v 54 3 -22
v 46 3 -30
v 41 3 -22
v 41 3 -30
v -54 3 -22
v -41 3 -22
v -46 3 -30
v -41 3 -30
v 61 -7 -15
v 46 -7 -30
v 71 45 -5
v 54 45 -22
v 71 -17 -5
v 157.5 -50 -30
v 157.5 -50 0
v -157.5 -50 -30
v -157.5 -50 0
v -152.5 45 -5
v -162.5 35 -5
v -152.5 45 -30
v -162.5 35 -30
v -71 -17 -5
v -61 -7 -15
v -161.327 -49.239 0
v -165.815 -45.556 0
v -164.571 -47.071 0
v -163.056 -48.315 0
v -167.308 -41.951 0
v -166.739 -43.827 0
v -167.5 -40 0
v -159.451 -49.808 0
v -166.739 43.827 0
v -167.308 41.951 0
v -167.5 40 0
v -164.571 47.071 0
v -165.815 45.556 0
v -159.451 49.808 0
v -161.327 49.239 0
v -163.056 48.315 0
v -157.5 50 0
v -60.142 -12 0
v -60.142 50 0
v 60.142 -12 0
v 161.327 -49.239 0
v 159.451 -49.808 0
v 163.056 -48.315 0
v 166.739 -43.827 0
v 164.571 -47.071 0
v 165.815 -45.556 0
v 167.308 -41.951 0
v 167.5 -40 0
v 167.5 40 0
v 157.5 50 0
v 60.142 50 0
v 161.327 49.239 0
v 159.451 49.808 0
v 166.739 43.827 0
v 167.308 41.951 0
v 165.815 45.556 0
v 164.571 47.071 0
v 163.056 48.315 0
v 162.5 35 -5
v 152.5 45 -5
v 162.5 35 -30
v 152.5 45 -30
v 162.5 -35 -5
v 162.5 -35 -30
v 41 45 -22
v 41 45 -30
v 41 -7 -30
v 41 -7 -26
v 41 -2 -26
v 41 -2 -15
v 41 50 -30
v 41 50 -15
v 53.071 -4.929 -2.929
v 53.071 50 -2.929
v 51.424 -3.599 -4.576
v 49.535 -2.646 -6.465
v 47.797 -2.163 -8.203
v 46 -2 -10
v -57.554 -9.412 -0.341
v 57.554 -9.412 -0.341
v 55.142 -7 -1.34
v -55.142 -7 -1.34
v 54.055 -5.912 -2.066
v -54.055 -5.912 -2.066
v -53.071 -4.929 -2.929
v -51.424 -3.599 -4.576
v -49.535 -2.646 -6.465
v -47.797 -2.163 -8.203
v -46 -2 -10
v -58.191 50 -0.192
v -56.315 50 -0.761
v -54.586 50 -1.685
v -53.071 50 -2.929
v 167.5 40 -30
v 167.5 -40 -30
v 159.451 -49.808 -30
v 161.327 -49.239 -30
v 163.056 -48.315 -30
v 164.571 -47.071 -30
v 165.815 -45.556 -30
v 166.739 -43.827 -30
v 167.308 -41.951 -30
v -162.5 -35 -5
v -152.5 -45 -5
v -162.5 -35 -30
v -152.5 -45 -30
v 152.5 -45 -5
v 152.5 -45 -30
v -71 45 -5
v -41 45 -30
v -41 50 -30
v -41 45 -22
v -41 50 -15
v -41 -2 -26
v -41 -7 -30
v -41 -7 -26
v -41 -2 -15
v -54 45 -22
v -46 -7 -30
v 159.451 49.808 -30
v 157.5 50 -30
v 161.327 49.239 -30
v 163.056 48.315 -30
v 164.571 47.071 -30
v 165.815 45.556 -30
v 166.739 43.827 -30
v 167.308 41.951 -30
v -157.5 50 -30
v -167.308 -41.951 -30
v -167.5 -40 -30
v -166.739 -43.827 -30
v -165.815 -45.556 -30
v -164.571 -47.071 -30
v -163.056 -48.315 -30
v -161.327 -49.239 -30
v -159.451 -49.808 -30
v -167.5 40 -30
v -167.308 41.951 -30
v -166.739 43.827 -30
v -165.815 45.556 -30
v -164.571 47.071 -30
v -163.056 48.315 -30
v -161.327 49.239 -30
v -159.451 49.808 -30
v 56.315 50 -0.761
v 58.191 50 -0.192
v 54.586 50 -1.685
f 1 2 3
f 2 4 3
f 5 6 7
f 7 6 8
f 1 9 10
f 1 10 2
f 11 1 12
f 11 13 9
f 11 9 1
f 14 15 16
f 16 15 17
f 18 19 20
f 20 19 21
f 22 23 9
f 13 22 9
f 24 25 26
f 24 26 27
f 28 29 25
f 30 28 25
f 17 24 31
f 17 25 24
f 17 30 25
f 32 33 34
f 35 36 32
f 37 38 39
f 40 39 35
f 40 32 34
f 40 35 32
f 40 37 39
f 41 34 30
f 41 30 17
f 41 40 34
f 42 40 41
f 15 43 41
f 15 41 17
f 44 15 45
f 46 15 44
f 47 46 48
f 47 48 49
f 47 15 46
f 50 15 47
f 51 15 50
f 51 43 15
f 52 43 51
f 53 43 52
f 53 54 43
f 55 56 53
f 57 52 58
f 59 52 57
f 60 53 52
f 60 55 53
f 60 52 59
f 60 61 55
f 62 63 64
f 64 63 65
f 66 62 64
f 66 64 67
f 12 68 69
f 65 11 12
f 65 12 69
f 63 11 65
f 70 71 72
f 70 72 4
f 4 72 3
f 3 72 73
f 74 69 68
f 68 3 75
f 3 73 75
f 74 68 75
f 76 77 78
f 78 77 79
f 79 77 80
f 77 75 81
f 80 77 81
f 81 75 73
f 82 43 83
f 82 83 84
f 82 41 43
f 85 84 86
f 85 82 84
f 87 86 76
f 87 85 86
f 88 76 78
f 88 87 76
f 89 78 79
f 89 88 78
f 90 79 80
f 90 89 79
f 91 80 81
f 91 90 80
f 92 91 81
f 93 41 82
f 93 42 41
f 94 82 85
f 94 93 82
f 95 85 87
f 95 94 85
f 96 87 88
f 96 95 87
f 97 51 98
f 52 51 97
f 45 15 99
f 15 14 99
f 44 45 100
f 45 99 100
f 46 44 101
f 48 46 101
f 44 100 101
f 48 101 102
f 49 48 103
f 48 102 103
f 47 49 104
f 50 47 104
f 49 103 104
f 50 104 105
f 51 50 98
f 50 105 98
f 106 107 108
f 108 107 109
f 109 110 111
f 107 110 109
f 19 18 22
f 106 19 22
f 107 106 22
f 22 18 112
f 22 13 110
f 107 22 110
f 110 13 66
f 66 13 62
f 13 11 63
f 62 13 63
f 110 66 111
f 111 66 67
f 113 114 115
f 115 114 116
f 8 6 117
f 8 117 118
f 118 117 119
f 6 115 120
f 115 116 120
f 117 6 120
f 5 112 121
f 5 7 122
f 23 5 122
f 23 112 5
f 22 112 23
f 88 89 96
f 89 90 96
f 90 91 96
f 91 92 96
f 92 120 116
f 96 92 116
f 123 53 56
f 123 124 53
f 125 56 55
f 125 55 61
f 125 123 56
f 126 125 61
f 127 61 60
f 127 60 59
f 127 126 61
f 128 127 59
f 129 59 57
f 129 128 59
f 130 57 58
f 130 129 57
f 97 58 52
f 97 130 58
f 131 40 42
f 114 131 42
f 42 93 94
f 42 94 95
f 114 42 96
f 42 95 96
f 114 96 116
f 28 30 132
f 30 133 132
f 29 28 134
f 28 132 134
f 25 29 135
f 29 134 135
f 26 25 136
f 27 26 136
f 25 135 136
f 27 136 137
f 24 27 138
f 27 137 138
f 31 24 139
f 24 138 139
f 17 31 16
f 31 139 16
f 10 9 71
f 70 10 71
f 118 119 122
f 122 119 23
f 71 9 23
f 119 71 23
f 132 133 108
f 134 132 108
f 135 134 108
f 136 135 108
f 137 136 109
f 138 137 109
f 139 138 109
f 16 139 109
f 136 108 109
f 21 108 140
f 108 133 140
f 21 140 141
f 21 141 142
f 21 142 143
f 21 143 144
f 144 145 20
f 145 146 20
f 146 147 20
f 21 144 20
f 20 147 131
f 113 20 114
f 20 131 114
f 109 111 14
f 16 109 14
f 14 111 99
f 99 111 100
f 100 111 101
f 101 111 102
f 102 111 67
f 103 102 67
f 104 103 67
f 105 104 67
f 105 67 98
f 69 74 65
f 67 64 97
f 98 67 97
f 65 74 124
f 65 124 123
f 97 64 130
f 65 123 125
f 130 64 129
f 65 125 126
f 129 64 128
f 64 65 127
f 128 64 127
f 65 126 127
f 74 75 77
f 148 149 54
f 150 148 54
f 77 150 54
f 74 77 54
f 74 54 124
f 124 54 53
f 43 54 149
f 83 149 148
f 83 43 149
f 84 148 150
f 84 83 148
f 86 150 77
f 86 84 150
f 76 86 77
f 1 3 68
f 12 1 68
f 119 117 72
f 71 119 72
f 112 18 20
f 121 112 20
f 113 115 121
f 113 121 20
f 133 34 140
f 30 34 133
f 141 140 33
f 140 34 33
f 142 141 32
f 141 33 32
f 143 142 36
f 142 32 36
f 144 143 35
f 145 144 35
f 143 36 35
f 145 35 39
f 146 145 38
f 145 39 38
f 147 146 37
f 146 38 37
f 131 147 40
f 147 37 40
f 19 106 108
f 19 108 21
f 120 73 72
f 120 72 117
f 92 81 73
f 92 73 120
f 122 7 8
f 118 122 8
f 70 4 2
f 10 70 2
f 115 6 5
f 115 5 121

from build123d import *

# Parameters (mm, degrees)
BOSS_EXTRUDE1_DEPTH = 5
BOSS_EXTRUDE2_DEPTH = 25
FILLET1_R           = 10
CHAMFER3_SIZE       = 25
CHAMFER4_SIZE       = 15
SKETCH3_W           = 8
SKETCH3_H           = 42
CUT_EXTRUDE1_DEPTH  = 25
SKETCH4_W           = 8
SKETCH4_H           = 42
CUT_EXTRUDE2_DEPTH  = 25
FILLET2_R           = 10
SKETCH5_W           = 82
SKETCH5_H           = 4
CUT_EXTRUDE3_DEPTH  = 10
CHAMFER5_SIZE       = 10
CHAMFER6_SIZE       = 10


with BuildPart() as part:
    # Sketch1 → Boss-Extrude1 (new body)
    with BuildSketch(Plane.XY):
        Polygon((-167.5, -50), (167.5, -50), (167.5, 50), (41, 50), (41, -2), (-41, -2), (-41, 50), (-167.5, 50), align=None)
    extrude(amount=-BOSS_EXTRUDE1_DEPTH)

    # Sketch2 → Boss-Extrude2 (add)
    with BuildSketch(Plane(origin=(0, 0, -5), x_dir=(-1, 0, 0), z_dir=(0, 0, -1))):
        Polygon((-167.5, 50), (-162.5, 50), (-41, 50), (-41, 45), (-41, -2), (41, -2), (41, 45), (41, 50), (162.5, 50), (167.5, 50), (167.5, -50), (162.5, -50), (-162.5, -50), (-167.5, -50), align=None)
        Polygon((-162.5, 45), (-162.5, -45), (162.5, -45), (162.5, 45), (46, 45), (46, -7), (41, -7), (-41, -7), (-46, -7), (-46, 45), align=None, mode=Mode.SUBTRACT)
    extrude(amount=BOSS_EXTRUDE2_DEPTH)

    # Fillet1
    fillet1_edges = [part.edges().sort_by_distance(p)[0] for p in [
        (167.5, 50, -15),
        (167.5, -50, -15),
        (-167.5, -50, -15),
        (-167.5, 50, -15),
    ]]
    fillet(fillet1_edges, radius=FILLET1_R)

    # Chamfer3
    chamfer3_edges = [part.edges().sort_by_distance(p)[0] for p in [
        (-46, 19, -5),
        (46, 19, -5),
    ]]
    chamfer(chamfer3_edges, length=CHAMFER3_SIZE - 0.0001)  # a hair under: the kernel refuses the full size

    # Chamfer4
    chamfer4_edges = [part.edges().sort_by_distance(p)[0] for p in [
        (-41, 24, 0),
        (41, 24, 0),
    ]]
    chamfer(chamfer4_edges, length=CHAMFER4_SIZE)

    # Sketch3 → Cut-Extrude1 (cut)
    with BuildSketch(Plane(origin=(-41, 0, 0), x_dir=(0, 0, -1), z_dir=(1, 0, 0))):
        with Locations((26, 24)):
            Rectangle(SKETCH3_W, SKETCH3_H)
    extrude(amount=-CUT_EXTRUDE1_DEPTH, mode=Mode.SUBTRACT)

    # Sketch4 → Cut-Extrude2 (cut)
    with BuildSketch(Plane.ZY.offset(-41)):
        with Locations((-26, 24)):
            Rectangle(SKETCH4_W, SKETCH4_H)
    extrude(amount=-CUT_EXTRUDE2_DEPTH, mode=Mode.SUBTRACT)

    # Fillet2
    fillet2_edges = [part.edges().sort_by_distance(p)[0] for p in [
        (0, -2, 0),
        (-56, 24, 0),
        (56, 24, 0),
    ]]
    fillet(fillet2_edges, radius=FILLET2_R)

    # Sketch5 → Cut-Extrude3 (cut)
    with BuildSketch(Plane(origin=(0, -2, 0), x_dir=(1, 0, 0), z_dir=(0, 1, 0))):
        with Locations((0, 28)):
            Rectangle(SKETCH5_W, SKETCH5_H)
    extrude(amount=-CUT_EXTRUDE3_DEPTH, mode=Mode.SUBTRACT)

    # Chamfer5
    chamfer5_edges = [part.edges().sort_by_distance(p)[0] for p in [
        (162.5, 45, -17.5),
        (162.5, -45, -17.5),
        (-162.5, -45, -17.5),
        (-162.5, 45, -17.5),
    ]]
    chamfer(chamfer5_edges, length=CHAMFER5_SIZE)

    # Chamfer6
    chamfer6_edges = [part.edges().sort_by_distance(p)[0] for p in [
        (0, -7, -5),
    ]]
    chamfer(chamfer6_edges, length=CHAMFER6_SIZE)


solid = part.part
